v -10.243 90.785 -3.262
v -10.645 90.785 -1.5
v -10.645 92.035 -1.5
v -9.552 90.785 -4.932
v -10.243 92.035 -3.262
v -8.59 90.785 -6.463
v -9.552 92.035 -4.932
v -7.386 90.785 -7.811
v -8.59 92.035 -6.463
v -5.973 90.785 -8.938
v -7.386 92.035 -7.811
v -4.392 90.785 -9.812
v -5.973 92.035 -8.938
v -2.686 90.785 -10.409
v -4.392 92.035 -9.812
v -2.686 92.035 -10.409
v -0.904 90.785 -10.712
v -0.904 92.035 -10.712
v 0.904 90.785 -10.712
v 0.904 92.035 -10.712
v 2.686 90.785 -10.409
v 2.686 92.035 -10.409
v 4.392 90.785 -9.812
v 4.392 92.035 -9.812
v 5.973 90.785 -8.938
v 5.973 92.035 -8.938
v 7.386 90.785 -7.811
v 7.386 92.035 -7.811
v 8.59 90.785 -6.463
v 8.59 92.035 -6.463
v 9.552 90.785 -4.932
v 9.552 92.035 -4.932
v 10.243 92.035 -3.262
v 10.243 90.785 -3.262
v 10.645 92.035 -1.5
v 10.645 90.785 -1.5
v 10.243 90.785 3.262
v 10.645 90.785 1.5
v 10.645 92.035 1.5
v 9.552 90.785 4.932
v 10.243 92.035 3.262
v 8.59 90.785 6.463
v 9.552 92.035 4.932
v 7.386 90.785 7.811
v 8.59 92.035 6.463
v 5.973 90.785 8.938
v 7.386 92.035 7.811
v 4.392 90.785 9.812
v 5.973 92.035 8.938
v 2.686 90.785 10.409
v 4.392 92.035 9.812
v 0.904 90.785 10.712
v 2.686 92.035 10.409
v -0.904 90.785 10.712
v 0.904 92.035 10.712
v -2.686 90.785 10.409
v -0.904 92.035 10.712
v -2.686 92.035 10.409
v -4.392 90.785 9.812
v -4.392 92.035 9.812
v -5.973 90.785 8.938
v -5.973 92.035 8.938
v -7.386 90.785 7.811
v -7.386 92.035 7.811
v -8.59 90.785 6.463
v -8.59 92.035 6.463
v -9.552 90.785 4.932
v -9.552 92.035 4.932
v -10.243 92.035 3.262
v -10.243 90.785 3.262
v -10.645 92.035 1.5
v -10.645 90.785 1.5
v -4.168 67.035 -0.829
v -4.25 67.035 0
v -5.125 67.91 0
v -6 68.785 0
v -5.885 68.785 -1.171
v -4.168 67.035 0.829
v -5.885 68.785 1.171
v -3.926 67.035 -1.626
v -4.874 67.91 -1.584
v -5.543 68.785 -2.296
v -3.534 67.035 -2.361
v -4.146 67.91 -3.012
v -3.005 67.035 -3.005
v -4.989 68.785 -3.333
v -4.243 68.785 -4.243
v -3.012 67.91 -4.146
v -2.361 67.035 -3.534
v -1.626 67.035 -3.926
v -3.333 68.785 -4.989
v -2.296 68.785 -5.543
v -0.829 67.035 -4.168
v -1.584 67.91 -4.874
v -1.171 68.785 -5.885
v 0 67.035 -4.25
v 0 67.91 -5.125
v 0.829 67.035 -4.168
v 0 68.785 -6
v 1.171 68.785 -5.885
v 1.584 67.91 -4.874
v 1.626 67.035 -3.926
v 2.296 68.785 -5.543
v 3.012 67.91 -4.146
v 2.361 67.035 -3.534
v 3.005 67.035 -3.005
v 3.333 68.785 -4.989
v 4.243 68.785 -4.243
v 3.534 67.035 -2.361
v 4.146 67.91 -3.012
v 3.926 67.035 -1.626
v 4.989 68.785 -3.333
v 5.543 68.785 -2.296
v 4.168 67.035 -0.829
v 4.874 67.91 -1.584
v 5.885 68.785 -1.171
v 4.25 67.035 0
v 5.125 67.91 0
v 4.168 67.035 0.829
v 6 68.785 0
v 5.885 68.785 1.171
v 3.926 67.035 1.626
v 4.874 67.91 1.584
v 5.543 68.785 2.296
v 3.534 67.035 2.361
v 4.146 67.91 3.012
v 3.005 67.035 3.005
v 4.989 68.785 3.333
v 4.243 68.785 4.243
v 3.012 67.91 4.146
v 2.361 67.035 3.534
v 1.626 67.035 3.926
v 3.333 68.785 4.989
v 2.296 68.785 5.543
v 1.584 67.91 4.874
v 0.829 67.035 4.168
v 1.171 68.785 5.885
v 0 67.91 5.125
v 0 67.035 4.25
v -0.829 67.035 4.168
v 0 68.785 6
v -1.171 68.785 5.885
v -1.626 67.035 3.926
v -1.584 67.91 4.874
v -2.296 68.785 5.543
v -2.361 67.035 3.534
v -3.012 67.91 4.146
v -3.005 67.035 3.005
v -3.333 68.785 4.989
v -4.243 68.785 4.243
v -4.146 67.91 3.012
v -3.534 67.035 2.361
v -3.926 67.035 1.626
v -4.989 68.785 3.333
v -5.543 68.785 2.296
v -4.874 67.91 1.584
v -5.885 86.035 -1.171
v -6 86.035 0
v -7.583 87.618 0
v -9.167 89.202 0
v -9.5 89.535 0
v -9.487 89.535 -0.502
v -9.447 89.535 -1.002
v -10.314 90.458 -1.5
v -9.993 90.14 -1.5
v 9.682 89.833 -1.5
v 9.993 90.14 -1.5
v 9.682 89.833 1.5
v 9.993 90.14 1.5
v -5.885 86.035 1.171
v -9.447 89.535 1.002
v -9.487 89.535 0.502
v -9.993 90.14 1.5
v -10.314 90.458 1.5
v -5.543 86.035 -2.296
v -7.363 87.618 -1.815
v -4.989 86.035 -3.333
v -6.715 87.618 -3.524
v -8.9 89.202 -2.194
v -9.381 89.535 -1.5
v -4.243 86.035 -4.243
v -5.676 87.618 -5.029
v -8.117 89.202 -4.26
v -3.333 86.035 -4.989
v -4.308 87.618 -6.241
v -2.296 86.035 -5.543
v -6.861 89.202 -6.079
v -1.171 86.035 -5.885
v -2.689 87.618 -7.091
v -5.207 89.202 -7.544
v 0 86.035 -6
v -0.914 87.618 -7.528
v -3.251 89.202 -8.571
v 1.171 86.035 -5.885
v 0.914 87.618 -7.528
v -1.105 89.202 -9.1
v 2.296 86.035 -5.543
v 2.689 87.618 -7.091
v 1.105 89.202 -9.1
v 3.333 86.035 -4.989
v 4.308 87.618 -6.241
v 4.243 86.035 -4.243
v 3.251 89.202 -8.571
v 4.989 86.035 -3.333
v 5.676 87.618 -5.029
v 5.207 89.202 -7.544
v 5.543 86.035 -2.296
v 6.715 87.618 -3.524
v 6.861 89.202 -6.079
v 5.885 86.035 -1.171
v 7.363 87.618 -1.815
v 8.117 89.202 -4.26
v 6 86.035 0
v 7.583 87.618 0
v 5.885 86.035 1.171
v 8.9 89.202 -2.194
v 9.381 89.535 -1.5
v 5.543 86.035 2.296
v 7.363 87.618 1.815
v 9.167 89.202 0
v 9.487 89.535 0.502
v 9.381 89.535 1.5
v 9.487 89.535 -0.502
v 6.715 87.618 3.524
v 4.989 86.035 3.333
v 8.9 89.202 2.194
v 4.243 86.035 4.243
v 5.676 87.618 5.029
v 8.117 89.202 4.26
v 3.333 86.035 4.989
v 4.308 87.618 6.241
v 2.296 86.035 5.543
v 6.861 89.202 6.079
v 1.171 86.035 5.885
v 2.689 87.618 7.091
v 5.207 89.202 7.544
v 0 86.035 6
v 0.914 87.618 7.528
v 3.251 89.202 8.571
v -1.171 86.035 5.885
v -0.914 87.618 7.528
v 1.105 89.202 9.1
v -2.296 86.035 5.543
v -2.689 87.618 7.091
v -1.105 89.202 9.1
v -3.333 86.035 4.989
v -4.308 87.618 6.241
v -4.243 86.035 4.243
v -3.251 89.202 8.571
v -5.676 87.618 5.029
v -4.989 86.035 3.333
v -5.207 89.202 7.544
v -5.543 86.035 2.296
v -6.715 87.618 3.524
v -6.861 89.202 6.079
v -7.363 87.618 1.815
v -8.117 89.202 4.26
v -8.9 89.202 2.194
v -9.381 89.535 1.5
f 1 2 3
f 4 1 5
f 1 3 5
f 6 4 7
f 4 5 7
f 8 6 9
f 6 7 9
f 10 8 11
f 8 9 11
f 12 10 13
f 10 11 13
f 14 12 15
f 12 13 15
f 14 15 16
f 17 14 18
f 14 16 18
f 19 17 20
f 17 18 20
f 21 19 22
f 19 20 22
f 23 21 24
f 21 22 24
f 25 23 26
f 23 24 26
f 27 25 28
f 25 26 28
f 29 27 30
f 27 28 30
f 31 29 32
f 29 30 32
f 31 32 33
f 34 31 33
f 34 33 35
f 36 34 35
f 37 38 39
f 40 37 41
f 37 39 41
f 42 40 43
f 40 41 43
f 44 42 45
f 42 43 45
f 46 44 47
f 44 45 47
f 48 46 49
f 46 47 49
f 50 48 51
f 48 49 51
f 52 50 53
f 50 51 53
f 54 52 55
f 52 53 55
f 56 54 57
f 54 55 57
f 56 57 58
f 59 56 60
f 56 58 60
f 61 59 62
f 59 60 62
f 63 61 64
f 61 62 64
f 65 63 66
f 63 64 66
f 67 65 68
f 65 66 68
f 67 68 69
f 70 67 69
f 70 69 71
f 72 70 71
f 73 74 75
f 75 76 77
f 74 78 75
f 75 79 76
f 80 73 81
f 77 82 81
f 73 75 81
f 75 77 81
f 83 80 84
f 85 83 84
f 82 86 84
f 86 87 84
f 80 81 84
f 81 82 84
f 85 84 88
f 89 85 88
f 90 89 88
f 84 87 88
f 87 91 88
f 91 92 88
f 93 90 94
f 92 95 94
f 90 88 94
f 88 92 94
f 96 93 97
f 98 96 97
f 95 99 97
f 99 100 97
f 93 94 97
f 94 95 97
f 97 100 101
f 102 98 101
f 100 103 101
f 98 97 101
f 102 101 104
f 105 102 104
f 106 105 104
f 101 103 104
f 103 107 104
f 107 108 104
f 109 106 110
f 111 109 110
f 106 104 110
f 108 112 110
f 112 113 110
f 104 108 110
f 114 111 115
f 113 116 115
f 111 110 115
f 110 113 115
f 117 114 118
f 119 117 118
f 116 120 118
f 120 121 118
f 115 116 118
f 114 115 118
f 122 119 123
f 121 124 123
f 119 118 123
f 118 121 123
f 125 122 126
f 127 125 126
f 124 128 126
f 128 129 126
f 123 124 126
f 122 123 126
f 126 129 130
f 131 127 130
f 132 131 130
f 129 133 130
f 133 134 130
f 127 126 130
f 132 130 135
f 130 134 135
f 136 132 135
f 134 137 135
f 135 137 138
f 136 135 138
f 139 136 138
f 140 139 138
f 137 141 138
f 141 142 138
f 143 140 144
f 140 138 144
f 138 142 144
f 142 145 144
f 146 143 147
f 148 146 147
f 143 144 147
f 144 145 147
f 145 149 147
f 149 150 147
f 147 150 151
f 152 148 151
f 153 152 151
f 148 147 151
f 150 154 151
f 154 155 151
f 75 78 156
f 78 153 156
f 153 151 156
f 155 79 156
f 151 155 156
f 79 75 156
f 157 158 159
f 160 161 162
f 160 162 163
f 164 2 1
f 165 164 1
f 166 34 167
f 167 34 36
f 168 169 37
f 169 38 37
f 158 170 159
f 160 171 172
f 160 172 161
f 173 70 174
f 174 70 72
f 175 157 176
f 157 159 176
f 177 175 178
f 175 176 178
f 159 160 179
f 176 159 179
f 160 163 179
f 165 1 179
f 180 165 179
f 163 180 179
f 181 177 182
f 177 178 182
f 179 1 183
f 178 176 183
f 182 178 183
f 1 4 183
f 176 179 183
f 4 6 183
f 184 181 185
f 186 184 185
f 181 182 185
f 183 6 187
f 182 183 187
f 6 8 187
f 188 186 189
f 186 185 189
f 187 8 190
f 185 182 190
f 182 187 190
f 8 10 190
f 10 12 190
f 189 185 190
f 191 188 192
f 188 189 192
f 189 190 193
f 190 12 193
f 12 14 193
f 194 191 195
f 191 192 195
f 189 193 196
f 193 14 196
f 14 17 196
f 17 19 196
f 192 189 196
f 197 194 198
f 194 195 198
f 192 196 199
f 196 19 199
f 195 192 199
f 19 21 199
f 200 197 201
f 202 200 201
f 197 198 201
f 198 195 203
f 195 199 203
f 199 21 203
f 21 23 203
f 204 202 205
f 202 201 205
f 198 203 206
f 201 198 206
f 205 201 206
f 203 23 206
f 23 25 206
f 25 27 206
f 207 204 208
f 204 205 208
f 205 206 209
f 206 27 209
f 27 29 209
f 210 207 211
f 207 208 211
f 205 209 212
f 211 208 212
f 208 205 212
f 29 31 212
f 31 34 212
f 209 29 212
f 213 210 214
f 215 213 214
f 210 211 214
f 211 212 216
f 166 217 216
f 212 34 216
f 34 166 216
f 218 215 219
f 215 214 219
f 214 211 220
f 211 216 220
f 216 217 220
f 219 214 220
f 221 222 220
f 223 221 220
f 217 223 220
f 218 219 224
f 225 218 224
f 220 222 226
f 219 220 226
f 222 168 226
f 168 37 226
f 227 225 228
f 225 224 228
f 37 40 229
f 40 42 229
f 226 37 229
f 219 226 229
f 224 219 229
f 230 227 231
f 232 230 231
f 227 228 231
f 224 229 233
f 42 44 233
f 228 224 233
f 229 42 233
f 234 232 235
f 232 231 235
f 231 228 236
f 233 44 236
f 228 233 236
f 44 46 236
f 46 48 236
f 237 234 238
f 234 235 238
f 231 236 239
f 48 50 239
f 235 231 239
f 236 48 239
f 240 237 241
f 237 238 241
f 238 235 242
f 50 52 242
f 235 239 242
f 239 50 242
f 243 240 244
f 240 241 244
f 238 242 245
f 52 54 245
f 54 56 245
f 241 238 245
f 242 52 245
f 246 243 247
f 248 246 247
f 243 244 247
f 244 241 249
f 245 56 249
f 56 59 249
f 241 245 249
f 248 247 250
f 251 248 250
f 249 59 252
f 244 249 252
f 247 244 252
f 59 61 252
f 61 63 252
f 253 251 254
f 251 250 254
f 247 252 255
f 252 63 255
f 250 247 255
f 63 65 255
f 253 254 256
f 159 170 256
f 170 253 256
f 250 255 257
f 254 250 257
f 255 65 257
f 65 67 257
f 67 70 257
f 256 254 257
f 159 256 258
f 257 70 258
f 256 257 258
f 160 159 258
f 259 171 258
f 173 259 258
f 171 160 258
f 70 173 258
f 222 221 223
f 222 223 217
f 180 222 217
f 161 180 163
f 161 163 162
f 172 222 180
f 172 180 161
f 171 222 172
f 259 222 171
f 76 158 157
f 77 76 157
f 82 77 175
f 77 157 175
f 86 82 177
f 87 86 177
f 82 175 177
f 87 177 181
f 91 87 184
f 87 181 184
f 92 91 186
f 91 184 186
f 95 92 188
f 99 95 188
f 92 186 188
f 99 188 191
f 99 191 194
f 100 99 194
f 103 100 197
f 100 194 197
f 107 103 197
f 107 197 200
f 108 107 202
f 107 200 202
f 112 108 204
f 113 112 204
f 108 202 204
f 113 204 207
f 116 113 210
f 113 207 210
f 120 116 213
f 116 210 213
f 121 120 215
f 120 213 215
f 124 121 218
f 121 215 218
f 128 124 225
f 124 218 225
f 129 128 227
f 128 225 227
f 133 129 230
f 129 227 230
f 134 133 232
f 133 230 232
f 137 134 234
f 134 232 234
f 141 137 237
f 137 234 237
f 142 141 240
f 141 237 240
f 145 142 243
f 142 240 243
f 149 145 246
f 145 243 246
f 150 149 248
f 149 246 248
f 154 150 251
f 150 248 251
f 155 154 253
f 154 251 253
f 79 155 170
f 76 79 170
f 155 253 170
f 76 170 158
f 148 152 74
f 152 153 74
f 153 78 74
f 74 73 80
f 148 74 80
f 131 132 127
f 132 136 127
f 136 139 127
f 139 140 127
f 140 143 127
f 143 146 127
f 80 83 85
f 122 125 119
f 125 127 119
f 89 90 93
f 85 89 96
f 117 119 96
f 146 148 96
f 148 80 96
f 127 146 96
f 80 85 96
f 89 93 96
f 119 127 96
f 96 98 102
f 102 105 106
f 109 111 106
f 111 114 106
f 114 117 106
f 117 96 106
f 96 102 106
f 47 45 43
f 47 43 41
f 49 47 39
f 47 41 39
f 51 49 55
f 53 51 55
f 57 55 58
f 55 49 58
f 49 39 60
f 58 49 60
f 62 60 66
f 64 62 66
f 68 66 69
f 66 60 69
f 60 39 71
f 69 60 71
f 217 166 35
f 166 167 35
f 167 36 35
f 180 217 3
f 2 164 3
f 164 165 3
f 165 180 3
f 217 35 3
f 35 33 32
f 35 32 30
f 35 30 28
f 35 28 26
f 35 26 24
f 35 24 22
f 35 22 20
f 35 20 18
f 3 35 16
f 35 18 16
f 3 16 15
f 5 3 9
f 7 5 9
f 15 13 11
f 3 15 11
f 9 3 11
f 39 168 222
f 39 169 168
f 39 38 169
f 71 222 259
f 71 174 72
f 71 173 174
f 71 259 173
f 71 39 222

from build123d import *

# Parameters (mm, degrees)
SKETCH_13_W         = 21.5
SKETCH_13_H         = 3
CUT_EXTRUDE_9_DEPTH = 2.5
CHAMFER_1_SIZE      = 1.75


with BuildPart() as part:
    # Эскиз1 → Повернуть1 (revolve)
    with BuildSketch(Plane.XY):
        Polygon((0, 92.035042223), (0, 67.035042223), (6, 67.035042223), (6, 86.035042223), (10.75, 90.785042223), (10.75, 92.035042223), align=None)
    revolve(axis=Axis((0, 125.763182898, 0), (0, -1, 0)))

    # Эскиз13 → Вырез-Вытянуть9 (cut)
    with BuildSketch(Plane(origin=(0, 92.035042223, 0), x_dir=(-1, 0, 0), z_dir=(0, 1, 0))):
        Rectangle(SKETCH_13_W, SKETCH_13_H)
    extrude(amount=-CUT_EXTRUDE_9_DEPTH, mode=Mode.SUBTRACT)

    # Фаска1
    chamfer_1_edges = [part.edges().sort_by_distance(p)[0] for p in [
        (-6, 67.035042223, 0),
    ]]
    chamfer(chamfer_1_edges, length=CHAMFER_1_SIZE)


solid = part.part
